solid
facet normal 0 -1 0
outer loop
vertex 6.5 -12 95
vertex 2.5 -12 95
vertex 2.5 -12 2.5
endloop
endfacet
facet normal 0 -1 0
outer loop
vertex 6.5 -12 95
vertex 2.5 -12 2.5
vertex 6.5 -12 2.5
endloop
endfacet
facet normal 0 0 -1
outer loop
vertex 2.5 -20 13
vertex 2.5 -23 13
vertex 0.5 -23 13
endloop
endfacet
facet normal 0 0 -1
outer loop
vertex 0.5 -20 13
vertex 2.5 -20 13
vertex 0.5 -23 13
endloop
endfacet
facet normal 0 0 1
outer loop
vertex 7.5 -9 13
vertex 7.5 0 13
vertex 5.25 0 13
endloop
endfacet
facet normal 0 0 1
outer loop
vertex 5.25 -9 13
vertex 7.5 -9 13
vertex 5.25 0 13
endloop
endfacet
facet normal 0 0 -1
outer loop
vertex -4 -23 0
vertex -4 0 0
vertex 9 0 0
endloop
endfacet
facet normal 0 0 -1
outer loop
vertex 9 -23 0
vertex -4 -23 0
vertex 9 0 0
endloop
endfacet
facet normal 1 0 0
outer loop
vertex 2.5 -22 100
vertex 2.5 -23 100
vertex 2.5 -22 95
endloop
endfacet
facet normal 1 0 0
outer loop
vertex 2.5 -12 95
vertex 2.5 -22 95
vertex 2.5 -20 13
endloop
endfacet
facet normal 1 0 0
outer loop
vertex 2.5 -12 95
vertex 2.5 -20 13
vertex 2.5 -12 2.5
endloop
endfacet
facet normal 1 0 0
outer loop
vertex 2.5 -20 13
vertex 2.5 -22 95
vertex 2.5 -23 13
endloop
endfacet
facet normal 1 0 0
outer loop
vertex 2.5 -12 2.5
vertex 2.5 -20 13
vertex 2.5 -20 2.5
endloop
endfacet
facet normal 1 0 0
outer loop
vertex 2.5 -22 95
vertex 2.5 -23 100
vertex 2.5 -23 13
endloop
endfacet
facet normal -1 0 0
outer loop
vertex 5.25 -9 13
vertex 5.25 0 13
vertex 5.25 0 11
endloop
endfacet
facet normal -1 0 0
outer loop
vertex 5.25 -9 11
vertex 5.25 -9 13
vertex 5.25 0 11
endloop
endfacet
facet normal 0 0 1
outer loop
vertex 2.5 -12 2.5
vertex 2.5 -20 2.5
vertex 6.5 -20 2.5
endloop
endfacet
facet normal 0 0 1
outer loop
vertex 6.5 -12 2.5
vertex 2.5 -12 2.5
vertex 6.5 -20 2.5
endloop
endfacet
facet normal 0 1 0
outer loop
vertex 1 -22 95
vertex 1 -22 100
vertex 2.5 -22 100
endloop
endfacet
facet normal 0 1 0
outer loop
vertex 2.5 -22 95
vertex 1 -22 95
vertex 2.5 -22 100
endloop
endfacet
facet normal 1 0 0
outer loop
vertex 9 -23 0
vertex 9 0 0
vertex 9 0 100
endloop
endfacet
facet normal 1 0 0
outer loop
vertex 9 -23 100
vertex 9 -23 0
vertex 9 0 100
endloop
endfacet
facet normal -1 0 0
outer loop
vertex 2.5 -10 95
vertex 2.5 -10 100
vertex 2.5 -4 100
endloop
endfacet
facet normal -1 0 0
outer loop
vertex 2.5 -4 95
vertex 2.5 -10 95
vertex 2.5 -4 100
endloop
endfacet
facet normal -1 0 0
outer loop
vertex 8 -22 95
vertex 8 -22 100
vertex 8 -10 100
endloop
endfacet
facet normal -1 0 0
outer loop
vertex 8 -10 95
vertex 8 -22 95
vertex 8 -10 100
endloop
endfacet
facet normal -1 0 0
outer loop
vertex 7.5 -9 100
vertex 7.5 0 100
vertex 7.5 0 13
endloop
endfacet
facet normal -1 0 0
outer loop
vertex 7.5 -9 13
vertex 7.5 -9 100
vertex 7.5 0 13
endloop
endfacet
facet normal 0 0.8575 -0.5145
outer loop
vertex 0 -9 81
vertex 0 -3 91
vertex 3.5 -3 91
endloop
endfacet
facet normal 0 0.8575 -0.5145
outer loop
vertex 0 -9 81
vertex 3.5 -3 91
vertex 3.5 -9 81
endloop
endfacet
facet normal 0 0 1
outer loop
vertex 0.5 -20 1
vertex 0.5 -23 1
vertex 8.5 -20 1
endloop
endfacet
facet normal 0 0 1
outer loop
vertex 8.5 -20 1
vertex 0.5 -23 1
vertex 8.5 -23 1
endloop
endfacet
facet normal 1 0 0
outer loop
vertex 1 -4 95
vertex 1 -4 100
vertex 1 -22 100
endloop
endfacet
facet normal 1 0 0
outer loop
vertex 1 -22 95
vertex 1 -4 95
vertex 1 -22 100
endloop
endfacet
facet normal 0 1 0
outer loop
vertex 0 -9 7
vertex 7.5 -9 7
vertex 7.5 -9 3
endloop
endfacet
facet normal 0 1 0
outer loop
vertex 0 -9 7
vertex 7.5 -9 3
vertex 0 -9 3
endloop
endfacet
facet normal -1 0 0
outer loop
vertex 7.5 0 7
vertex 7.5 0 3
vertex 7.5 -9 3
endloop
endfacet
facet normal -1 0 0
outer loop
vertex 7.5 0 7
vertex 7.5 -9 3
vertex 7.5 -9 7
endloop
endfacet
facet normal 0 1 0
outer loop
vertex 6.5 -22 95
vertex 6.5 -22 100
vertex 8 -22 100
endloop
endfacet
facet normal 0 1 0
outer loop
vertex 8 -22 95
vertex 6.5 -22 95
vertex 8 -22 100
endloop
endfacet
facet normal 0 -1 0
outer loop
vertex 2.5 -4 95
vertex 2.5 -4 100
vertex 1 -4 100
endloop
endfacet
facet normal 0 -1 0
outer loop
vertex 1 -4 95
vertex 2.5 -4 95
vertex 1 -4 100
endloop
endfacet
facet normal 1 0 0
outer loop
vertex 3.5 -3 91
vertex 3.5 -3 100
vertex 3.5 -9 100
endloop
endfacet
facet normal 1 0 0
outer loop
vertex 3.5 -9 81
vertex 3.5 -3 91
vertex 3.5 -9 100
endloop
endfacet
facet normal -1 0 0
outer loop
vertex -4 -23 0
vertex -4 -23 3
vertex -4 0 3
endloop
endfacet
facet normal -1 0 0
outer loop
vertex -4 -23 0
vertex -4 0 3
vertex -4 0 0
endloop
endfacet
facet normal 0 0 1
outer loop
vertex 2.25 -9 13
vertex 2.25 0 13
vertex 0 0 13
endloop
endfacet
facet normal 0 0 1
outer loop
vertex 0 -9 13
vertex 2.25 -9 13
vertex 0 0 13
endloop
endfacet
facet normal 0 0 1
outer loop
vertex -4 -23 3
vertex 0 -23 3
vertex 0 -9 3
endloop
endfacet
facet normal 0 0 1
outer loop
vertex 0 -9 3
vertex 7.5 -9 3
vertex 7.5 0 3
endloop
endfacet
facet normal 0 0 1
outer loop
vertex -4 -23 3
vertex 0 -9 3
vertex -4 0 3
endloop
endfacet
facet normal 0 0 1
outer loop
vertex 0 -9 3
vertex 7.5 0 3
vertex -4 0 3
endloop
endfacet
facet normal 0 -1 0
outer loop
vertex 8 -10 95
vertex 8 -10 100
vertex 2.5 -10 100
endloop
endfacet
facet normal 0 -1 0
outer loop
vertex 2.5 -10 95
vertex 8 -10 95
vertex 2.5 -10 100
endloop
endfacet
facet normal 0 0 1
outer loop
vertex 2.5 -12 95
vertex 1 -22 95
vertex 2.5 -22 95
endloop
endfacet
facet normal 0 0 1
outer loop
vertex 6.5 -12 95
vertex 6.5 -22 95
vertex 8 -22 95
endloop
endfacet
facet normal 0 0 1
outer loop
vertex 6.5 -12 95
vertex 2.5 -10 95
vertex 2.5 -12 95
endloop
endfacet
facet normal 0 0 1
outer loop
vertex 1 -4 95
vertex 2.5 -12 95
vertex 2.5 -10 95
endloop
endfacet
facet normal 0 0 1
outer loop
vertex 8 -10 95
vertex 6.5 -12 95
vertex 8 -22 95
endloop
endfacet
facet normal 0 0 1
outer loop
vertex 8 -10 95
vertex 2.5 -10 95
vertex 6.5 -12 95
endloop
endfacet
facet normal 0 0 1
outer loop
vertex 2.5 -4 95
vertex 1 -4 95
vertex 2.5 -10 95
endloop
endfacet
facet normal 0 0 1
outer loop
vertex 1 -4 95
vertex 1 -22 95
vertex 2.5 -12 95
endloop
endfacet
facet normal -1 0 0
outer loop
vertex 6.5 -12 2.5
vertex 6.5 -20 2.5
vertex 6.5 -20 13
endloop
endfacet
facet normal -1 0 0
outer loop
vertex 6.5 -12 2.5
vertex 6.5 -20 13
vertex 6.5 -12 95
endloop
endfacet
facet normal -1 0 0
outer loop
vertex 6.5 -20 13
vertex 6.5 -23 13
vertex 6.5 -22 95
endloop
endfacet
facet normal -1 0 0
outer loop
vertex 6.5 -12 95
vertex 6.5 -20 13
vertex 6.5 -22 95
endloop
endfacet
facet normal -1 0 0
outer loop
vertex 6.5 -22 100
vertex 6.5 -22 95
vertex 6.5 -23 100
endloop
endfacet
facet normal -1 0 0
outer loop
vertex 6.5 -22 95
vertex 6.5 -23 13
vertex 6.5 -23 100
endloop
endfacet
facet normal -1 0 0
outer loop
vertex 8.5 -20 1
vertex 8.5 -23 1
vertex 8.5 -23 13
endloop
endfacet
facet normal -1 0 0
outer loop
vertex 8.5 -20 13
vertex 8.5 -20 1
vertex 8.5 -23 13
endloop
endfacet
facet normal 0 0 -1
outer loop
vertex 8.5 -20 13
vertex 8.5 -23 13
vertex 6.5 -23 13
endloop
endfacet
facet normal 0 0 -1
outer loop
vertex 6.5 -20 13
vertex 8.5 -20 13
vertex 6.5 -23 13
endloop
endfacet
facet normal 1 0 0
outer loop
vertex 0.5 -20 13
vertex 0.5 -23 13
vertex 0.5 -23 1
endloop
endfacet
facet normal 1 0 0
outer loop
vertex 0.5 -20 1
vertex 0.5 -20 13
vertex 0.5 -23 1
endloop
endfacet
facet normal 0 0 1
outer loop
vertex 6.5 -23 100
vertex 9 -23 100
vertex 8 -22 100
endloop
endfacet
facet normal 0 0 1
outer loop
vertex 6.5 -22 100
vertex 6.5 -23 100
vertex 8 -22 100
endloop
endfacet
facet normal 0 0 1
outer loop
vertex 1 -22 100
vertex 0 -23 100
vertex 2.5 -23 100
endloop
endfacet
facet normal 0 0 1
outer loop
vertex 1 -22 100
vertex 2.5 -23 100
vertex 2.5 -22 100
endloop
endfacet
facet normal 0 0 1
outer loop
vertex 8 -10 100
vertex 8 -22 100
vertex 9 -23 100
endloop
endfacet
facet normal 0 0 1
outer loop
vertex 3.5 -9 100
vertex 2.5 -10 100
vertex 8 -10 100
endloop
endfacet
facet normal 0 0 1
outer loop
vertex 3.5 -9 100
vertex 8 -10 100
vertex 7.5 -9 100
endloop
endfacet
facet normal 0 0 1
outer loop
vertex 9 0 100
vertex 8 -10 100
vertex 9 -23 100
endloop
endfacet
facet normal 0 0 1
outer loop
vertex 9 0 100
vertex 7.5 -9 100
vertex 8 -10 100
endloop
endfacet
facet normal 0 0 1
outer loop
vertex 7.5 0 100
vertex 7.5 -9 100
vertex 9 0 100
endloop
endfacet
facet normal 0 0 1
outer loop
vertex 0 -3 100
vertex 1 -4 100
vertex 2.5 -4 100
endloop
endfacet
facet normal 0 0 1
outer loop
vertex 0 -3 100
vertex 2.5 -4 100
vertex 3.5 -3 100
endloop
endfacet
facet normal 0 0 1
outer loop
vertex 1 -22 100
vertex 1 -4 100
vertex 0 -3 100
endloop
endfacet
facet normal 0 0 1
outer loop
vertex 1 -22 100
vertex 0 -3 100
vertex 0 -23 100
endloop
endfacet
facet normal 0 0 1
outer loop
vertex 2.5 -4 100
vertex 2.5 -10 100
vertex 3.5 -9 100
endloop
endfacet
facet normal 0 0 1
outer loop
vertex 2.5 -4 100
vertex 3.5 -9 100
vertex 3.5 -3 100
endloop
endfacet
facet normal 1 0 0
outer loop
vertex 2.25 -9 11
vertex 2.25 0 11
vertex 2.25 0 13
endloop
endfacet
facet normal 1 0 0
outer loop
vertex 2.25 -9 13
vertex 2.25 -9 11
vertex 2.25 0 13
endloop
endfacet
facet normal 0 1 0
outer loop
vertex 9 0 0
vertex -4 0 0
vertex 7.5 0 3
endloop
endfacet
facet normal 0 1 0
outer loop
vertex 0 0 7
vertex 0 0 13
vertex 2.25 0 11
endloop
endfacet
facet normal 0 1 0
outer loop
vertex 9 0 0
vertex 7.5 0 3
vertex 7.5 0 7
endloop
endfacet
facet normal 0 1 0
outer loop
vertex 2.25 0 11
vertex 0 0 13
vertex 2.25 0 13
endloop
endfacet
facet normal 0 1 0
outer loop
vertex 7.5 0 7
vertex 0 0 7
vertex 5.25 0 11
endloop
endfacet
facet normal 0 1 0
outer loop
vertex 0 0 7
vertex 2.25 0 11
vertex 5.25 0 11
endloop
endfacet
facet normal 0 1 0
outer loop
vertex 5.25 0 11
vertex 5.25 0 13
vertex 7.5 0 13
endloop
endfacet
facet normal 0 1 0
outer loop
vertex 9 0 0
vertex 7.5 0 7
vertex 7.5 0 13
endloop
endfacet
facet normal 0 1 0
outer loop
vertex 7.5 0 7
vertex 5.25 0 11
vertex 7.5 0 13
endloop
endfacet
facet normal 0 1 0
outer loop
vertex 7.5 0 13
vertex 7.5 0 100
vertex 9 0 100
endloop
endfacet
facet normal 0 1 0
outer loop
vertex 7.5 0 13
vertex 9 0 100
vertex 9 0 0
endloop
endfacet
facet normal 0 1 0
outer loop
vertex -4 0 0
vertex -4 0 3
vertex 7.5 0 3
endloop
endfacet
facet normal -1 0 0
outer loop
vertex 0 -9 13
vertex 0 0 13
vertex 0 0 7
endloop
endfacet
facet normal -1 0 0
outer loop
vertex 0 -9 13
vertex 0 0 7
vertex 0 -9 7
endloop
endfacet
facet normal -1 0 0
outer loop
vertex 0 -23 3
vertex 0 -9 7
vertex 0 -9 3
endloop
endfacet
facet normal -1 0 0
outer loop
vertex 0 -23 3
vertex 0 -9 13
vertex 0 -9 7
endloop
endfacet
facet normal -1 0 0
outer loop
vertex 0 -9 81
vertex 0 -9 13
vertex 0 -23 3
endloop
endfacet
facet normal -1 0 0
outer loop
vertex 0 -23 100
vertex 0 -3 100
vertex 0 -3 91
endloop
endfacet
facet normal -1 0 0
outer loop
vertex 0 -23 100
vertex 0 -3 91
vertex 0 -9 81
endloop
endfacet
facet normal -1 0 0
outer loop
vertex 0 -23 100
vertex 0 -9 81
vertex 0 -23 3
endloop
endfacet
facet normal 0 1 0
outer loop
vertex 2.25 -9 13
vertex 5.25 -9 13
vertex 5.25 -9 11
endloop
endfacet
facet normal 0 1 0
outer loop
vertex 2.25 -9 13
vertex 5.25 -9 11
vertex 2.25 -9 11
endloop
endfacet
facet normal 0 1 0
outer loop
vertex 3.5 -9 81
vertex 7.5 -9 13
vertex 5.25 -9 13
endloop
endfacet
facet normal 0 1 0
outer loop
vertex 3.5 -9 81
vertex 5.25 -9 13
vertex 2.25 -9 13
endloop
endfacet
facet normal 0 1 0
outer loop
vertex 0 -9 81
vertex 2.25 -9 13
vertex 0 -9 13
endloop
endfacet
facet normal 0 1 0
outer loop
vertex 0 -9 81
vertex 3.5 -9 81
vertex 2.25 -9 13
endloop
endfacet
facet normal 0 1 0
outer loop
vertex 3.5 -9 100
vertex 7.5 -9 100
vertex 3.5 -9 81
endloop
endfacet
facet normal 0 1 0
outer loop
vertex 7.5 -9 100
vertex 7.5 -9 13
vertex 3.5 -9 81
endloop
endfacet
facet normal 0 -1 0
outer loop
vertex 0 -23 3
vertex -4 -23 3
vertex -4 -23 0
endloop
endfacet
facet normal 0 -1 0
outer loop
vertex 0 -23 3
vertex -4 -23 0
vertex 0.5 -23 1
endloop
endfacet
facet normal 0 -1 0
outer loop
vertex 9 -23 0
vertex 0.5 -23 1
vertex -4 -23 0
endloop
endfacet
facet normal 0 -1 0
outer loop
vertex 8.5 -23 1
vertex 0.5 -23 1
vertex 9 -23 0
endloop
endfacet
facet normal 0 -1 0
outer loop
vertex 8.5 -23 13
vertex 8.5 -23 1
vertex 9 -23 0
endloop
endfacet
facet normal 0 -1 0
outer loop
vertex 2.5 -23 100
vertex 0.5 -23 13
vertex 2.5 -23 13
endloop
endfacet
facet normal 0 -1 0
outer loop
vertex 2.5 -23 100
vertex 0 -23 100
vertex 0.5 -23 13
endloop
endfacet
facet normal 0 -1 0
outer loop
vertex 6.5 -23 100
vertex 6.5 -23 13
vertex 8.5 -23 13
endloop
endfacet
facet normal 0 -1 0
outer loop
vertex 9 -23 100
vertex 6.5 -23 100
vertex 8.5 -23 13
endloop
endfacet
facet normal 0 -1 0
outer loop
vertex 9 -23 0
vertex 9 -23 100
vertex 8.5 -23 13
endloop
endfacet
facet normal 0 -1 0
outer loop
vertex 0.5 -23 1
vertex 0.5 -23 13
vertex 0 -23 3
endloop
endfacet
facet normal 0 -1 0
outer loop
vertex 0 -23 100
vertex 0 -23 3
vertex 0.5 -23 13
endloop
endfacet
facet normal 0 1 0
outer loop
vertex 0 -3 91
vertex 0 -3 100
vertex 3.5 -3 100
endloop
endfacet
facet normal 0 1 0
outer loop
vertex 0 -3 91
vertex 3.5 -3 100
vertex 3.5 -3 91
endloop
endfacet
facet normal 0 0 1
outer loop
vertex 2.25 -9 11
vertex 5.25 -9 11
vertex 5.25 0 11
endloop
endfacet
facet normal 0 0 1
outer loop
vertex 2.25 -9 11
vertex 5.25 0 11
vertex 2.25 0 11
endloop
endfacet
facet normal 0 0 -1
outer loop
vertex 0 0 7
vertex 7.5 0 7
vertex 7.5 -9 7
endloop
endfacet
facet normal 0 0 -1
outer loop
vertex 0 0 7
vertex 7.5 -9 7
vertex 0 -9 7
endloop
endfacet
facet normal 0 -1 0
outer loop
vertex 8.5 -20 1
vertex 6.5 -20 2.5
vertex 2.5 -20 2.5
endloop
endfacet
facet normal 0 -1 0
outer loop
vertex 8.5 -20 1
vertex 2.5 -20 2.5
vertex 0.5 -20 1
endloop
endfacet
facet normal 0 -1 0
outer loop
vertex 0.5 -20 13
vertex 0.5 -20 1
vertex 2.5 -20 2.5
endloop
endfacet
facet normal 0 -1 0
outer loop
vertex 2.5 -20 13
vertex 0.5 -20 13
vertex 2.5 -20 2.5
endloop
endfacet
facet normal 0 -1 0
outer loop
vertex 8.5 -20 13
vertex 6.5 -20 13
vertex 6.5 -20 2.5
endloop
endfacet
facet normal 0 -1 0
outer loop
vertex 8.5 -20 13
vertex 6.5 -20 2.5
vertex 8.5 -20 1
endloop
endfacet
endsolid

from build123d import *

# Parameters (mm, degrees)
F1_DEPTH  = 23
F2_W      = 7.5
F2_H      = 4
F3_DEPTH  = 9
F5_DEPTH  = 3.5
F7_DEPTH  = 11
F9_DEPTH  = 3
F11_DEPTH = 5


with BuildPart() as f1:
    # F0 (on Front) → F1 (new body)
    with BuildSketch(Plane.XZ):
        Polygon((9, 100), (0, 100), (0, 3), (-4, 3), (-4, 0), (9, 0), align=None)
    extrude(amount=F1_DEPTH)

    # F2 (on face) → F3 (cut)
    with BuildSketch(Plane(origin=(0, 0, 0), x_dir=(-1, 0, 0), z_dir=(0, 1, 0))):
        Polygon((0, 100), (-7.5, 100), (-7.5, 13), (-5.25, 13), (-5.25, 11), (-2.25, 11), (-2.25, 13), (0, 13), align=None)
        with Locations((-3.75, 5)):
            Rectangle(F2_W, F2_H)
    extrude(amount=-F3_DEPTH, mode=Mode.SUBTRACT)

    # F4 (on face) → F5 (join)
    with BuildSketch(Plane(origin=(0, 0, 0), x_dir=(0, -1, 0), z_dir=(-1, 0, 0))):
        Polygon((9, 81), (9, 100), (3, 100), (3, 91), align=None)
    extrude(amount=-F5_DEPTH)

    # F6 (on face) → F7 (cut)
    with BuildSketch(Plane.XZ.offset(23)):
        Polygon((2.5, 100), (2.5, 97.5), (2.5, 2.5), (6.5, 2.5), (6.5, 97.5), (6.5, 100), align=None)
    extrude(amount=-F7_DEPTH, mode=Mode.SUBTRACT)

    # F8 (on face) → F9 (cut)
    with BuildSketch(Plane.XZ.offset(23)):
        Polygon((2.5, 2.5), (2.5, 13), (0.5, 13), (0.5, 1), (8.5, 1), (8.5, 13), (6.5, 13), (6.5, 2.5), align=None)
    extrude(amount=-F9_DEPTH, mode=Mode.SUBTRACT)

    # F10 (on face) → F11 (cut)
    with BuildSketch(Plane.XY.offset(100)):
        Polygon((1, -22), (2.5, -22), (2.5, -12), (6.5, -12), (6.5, -22), (8, -22), (8, -10), (2.5, -10), (2.5, -4), (1, -4), align=None)
    extrude(amount=-F11_DEPTH, mode=Mode.SUBTRACT)


solid = f1.part
